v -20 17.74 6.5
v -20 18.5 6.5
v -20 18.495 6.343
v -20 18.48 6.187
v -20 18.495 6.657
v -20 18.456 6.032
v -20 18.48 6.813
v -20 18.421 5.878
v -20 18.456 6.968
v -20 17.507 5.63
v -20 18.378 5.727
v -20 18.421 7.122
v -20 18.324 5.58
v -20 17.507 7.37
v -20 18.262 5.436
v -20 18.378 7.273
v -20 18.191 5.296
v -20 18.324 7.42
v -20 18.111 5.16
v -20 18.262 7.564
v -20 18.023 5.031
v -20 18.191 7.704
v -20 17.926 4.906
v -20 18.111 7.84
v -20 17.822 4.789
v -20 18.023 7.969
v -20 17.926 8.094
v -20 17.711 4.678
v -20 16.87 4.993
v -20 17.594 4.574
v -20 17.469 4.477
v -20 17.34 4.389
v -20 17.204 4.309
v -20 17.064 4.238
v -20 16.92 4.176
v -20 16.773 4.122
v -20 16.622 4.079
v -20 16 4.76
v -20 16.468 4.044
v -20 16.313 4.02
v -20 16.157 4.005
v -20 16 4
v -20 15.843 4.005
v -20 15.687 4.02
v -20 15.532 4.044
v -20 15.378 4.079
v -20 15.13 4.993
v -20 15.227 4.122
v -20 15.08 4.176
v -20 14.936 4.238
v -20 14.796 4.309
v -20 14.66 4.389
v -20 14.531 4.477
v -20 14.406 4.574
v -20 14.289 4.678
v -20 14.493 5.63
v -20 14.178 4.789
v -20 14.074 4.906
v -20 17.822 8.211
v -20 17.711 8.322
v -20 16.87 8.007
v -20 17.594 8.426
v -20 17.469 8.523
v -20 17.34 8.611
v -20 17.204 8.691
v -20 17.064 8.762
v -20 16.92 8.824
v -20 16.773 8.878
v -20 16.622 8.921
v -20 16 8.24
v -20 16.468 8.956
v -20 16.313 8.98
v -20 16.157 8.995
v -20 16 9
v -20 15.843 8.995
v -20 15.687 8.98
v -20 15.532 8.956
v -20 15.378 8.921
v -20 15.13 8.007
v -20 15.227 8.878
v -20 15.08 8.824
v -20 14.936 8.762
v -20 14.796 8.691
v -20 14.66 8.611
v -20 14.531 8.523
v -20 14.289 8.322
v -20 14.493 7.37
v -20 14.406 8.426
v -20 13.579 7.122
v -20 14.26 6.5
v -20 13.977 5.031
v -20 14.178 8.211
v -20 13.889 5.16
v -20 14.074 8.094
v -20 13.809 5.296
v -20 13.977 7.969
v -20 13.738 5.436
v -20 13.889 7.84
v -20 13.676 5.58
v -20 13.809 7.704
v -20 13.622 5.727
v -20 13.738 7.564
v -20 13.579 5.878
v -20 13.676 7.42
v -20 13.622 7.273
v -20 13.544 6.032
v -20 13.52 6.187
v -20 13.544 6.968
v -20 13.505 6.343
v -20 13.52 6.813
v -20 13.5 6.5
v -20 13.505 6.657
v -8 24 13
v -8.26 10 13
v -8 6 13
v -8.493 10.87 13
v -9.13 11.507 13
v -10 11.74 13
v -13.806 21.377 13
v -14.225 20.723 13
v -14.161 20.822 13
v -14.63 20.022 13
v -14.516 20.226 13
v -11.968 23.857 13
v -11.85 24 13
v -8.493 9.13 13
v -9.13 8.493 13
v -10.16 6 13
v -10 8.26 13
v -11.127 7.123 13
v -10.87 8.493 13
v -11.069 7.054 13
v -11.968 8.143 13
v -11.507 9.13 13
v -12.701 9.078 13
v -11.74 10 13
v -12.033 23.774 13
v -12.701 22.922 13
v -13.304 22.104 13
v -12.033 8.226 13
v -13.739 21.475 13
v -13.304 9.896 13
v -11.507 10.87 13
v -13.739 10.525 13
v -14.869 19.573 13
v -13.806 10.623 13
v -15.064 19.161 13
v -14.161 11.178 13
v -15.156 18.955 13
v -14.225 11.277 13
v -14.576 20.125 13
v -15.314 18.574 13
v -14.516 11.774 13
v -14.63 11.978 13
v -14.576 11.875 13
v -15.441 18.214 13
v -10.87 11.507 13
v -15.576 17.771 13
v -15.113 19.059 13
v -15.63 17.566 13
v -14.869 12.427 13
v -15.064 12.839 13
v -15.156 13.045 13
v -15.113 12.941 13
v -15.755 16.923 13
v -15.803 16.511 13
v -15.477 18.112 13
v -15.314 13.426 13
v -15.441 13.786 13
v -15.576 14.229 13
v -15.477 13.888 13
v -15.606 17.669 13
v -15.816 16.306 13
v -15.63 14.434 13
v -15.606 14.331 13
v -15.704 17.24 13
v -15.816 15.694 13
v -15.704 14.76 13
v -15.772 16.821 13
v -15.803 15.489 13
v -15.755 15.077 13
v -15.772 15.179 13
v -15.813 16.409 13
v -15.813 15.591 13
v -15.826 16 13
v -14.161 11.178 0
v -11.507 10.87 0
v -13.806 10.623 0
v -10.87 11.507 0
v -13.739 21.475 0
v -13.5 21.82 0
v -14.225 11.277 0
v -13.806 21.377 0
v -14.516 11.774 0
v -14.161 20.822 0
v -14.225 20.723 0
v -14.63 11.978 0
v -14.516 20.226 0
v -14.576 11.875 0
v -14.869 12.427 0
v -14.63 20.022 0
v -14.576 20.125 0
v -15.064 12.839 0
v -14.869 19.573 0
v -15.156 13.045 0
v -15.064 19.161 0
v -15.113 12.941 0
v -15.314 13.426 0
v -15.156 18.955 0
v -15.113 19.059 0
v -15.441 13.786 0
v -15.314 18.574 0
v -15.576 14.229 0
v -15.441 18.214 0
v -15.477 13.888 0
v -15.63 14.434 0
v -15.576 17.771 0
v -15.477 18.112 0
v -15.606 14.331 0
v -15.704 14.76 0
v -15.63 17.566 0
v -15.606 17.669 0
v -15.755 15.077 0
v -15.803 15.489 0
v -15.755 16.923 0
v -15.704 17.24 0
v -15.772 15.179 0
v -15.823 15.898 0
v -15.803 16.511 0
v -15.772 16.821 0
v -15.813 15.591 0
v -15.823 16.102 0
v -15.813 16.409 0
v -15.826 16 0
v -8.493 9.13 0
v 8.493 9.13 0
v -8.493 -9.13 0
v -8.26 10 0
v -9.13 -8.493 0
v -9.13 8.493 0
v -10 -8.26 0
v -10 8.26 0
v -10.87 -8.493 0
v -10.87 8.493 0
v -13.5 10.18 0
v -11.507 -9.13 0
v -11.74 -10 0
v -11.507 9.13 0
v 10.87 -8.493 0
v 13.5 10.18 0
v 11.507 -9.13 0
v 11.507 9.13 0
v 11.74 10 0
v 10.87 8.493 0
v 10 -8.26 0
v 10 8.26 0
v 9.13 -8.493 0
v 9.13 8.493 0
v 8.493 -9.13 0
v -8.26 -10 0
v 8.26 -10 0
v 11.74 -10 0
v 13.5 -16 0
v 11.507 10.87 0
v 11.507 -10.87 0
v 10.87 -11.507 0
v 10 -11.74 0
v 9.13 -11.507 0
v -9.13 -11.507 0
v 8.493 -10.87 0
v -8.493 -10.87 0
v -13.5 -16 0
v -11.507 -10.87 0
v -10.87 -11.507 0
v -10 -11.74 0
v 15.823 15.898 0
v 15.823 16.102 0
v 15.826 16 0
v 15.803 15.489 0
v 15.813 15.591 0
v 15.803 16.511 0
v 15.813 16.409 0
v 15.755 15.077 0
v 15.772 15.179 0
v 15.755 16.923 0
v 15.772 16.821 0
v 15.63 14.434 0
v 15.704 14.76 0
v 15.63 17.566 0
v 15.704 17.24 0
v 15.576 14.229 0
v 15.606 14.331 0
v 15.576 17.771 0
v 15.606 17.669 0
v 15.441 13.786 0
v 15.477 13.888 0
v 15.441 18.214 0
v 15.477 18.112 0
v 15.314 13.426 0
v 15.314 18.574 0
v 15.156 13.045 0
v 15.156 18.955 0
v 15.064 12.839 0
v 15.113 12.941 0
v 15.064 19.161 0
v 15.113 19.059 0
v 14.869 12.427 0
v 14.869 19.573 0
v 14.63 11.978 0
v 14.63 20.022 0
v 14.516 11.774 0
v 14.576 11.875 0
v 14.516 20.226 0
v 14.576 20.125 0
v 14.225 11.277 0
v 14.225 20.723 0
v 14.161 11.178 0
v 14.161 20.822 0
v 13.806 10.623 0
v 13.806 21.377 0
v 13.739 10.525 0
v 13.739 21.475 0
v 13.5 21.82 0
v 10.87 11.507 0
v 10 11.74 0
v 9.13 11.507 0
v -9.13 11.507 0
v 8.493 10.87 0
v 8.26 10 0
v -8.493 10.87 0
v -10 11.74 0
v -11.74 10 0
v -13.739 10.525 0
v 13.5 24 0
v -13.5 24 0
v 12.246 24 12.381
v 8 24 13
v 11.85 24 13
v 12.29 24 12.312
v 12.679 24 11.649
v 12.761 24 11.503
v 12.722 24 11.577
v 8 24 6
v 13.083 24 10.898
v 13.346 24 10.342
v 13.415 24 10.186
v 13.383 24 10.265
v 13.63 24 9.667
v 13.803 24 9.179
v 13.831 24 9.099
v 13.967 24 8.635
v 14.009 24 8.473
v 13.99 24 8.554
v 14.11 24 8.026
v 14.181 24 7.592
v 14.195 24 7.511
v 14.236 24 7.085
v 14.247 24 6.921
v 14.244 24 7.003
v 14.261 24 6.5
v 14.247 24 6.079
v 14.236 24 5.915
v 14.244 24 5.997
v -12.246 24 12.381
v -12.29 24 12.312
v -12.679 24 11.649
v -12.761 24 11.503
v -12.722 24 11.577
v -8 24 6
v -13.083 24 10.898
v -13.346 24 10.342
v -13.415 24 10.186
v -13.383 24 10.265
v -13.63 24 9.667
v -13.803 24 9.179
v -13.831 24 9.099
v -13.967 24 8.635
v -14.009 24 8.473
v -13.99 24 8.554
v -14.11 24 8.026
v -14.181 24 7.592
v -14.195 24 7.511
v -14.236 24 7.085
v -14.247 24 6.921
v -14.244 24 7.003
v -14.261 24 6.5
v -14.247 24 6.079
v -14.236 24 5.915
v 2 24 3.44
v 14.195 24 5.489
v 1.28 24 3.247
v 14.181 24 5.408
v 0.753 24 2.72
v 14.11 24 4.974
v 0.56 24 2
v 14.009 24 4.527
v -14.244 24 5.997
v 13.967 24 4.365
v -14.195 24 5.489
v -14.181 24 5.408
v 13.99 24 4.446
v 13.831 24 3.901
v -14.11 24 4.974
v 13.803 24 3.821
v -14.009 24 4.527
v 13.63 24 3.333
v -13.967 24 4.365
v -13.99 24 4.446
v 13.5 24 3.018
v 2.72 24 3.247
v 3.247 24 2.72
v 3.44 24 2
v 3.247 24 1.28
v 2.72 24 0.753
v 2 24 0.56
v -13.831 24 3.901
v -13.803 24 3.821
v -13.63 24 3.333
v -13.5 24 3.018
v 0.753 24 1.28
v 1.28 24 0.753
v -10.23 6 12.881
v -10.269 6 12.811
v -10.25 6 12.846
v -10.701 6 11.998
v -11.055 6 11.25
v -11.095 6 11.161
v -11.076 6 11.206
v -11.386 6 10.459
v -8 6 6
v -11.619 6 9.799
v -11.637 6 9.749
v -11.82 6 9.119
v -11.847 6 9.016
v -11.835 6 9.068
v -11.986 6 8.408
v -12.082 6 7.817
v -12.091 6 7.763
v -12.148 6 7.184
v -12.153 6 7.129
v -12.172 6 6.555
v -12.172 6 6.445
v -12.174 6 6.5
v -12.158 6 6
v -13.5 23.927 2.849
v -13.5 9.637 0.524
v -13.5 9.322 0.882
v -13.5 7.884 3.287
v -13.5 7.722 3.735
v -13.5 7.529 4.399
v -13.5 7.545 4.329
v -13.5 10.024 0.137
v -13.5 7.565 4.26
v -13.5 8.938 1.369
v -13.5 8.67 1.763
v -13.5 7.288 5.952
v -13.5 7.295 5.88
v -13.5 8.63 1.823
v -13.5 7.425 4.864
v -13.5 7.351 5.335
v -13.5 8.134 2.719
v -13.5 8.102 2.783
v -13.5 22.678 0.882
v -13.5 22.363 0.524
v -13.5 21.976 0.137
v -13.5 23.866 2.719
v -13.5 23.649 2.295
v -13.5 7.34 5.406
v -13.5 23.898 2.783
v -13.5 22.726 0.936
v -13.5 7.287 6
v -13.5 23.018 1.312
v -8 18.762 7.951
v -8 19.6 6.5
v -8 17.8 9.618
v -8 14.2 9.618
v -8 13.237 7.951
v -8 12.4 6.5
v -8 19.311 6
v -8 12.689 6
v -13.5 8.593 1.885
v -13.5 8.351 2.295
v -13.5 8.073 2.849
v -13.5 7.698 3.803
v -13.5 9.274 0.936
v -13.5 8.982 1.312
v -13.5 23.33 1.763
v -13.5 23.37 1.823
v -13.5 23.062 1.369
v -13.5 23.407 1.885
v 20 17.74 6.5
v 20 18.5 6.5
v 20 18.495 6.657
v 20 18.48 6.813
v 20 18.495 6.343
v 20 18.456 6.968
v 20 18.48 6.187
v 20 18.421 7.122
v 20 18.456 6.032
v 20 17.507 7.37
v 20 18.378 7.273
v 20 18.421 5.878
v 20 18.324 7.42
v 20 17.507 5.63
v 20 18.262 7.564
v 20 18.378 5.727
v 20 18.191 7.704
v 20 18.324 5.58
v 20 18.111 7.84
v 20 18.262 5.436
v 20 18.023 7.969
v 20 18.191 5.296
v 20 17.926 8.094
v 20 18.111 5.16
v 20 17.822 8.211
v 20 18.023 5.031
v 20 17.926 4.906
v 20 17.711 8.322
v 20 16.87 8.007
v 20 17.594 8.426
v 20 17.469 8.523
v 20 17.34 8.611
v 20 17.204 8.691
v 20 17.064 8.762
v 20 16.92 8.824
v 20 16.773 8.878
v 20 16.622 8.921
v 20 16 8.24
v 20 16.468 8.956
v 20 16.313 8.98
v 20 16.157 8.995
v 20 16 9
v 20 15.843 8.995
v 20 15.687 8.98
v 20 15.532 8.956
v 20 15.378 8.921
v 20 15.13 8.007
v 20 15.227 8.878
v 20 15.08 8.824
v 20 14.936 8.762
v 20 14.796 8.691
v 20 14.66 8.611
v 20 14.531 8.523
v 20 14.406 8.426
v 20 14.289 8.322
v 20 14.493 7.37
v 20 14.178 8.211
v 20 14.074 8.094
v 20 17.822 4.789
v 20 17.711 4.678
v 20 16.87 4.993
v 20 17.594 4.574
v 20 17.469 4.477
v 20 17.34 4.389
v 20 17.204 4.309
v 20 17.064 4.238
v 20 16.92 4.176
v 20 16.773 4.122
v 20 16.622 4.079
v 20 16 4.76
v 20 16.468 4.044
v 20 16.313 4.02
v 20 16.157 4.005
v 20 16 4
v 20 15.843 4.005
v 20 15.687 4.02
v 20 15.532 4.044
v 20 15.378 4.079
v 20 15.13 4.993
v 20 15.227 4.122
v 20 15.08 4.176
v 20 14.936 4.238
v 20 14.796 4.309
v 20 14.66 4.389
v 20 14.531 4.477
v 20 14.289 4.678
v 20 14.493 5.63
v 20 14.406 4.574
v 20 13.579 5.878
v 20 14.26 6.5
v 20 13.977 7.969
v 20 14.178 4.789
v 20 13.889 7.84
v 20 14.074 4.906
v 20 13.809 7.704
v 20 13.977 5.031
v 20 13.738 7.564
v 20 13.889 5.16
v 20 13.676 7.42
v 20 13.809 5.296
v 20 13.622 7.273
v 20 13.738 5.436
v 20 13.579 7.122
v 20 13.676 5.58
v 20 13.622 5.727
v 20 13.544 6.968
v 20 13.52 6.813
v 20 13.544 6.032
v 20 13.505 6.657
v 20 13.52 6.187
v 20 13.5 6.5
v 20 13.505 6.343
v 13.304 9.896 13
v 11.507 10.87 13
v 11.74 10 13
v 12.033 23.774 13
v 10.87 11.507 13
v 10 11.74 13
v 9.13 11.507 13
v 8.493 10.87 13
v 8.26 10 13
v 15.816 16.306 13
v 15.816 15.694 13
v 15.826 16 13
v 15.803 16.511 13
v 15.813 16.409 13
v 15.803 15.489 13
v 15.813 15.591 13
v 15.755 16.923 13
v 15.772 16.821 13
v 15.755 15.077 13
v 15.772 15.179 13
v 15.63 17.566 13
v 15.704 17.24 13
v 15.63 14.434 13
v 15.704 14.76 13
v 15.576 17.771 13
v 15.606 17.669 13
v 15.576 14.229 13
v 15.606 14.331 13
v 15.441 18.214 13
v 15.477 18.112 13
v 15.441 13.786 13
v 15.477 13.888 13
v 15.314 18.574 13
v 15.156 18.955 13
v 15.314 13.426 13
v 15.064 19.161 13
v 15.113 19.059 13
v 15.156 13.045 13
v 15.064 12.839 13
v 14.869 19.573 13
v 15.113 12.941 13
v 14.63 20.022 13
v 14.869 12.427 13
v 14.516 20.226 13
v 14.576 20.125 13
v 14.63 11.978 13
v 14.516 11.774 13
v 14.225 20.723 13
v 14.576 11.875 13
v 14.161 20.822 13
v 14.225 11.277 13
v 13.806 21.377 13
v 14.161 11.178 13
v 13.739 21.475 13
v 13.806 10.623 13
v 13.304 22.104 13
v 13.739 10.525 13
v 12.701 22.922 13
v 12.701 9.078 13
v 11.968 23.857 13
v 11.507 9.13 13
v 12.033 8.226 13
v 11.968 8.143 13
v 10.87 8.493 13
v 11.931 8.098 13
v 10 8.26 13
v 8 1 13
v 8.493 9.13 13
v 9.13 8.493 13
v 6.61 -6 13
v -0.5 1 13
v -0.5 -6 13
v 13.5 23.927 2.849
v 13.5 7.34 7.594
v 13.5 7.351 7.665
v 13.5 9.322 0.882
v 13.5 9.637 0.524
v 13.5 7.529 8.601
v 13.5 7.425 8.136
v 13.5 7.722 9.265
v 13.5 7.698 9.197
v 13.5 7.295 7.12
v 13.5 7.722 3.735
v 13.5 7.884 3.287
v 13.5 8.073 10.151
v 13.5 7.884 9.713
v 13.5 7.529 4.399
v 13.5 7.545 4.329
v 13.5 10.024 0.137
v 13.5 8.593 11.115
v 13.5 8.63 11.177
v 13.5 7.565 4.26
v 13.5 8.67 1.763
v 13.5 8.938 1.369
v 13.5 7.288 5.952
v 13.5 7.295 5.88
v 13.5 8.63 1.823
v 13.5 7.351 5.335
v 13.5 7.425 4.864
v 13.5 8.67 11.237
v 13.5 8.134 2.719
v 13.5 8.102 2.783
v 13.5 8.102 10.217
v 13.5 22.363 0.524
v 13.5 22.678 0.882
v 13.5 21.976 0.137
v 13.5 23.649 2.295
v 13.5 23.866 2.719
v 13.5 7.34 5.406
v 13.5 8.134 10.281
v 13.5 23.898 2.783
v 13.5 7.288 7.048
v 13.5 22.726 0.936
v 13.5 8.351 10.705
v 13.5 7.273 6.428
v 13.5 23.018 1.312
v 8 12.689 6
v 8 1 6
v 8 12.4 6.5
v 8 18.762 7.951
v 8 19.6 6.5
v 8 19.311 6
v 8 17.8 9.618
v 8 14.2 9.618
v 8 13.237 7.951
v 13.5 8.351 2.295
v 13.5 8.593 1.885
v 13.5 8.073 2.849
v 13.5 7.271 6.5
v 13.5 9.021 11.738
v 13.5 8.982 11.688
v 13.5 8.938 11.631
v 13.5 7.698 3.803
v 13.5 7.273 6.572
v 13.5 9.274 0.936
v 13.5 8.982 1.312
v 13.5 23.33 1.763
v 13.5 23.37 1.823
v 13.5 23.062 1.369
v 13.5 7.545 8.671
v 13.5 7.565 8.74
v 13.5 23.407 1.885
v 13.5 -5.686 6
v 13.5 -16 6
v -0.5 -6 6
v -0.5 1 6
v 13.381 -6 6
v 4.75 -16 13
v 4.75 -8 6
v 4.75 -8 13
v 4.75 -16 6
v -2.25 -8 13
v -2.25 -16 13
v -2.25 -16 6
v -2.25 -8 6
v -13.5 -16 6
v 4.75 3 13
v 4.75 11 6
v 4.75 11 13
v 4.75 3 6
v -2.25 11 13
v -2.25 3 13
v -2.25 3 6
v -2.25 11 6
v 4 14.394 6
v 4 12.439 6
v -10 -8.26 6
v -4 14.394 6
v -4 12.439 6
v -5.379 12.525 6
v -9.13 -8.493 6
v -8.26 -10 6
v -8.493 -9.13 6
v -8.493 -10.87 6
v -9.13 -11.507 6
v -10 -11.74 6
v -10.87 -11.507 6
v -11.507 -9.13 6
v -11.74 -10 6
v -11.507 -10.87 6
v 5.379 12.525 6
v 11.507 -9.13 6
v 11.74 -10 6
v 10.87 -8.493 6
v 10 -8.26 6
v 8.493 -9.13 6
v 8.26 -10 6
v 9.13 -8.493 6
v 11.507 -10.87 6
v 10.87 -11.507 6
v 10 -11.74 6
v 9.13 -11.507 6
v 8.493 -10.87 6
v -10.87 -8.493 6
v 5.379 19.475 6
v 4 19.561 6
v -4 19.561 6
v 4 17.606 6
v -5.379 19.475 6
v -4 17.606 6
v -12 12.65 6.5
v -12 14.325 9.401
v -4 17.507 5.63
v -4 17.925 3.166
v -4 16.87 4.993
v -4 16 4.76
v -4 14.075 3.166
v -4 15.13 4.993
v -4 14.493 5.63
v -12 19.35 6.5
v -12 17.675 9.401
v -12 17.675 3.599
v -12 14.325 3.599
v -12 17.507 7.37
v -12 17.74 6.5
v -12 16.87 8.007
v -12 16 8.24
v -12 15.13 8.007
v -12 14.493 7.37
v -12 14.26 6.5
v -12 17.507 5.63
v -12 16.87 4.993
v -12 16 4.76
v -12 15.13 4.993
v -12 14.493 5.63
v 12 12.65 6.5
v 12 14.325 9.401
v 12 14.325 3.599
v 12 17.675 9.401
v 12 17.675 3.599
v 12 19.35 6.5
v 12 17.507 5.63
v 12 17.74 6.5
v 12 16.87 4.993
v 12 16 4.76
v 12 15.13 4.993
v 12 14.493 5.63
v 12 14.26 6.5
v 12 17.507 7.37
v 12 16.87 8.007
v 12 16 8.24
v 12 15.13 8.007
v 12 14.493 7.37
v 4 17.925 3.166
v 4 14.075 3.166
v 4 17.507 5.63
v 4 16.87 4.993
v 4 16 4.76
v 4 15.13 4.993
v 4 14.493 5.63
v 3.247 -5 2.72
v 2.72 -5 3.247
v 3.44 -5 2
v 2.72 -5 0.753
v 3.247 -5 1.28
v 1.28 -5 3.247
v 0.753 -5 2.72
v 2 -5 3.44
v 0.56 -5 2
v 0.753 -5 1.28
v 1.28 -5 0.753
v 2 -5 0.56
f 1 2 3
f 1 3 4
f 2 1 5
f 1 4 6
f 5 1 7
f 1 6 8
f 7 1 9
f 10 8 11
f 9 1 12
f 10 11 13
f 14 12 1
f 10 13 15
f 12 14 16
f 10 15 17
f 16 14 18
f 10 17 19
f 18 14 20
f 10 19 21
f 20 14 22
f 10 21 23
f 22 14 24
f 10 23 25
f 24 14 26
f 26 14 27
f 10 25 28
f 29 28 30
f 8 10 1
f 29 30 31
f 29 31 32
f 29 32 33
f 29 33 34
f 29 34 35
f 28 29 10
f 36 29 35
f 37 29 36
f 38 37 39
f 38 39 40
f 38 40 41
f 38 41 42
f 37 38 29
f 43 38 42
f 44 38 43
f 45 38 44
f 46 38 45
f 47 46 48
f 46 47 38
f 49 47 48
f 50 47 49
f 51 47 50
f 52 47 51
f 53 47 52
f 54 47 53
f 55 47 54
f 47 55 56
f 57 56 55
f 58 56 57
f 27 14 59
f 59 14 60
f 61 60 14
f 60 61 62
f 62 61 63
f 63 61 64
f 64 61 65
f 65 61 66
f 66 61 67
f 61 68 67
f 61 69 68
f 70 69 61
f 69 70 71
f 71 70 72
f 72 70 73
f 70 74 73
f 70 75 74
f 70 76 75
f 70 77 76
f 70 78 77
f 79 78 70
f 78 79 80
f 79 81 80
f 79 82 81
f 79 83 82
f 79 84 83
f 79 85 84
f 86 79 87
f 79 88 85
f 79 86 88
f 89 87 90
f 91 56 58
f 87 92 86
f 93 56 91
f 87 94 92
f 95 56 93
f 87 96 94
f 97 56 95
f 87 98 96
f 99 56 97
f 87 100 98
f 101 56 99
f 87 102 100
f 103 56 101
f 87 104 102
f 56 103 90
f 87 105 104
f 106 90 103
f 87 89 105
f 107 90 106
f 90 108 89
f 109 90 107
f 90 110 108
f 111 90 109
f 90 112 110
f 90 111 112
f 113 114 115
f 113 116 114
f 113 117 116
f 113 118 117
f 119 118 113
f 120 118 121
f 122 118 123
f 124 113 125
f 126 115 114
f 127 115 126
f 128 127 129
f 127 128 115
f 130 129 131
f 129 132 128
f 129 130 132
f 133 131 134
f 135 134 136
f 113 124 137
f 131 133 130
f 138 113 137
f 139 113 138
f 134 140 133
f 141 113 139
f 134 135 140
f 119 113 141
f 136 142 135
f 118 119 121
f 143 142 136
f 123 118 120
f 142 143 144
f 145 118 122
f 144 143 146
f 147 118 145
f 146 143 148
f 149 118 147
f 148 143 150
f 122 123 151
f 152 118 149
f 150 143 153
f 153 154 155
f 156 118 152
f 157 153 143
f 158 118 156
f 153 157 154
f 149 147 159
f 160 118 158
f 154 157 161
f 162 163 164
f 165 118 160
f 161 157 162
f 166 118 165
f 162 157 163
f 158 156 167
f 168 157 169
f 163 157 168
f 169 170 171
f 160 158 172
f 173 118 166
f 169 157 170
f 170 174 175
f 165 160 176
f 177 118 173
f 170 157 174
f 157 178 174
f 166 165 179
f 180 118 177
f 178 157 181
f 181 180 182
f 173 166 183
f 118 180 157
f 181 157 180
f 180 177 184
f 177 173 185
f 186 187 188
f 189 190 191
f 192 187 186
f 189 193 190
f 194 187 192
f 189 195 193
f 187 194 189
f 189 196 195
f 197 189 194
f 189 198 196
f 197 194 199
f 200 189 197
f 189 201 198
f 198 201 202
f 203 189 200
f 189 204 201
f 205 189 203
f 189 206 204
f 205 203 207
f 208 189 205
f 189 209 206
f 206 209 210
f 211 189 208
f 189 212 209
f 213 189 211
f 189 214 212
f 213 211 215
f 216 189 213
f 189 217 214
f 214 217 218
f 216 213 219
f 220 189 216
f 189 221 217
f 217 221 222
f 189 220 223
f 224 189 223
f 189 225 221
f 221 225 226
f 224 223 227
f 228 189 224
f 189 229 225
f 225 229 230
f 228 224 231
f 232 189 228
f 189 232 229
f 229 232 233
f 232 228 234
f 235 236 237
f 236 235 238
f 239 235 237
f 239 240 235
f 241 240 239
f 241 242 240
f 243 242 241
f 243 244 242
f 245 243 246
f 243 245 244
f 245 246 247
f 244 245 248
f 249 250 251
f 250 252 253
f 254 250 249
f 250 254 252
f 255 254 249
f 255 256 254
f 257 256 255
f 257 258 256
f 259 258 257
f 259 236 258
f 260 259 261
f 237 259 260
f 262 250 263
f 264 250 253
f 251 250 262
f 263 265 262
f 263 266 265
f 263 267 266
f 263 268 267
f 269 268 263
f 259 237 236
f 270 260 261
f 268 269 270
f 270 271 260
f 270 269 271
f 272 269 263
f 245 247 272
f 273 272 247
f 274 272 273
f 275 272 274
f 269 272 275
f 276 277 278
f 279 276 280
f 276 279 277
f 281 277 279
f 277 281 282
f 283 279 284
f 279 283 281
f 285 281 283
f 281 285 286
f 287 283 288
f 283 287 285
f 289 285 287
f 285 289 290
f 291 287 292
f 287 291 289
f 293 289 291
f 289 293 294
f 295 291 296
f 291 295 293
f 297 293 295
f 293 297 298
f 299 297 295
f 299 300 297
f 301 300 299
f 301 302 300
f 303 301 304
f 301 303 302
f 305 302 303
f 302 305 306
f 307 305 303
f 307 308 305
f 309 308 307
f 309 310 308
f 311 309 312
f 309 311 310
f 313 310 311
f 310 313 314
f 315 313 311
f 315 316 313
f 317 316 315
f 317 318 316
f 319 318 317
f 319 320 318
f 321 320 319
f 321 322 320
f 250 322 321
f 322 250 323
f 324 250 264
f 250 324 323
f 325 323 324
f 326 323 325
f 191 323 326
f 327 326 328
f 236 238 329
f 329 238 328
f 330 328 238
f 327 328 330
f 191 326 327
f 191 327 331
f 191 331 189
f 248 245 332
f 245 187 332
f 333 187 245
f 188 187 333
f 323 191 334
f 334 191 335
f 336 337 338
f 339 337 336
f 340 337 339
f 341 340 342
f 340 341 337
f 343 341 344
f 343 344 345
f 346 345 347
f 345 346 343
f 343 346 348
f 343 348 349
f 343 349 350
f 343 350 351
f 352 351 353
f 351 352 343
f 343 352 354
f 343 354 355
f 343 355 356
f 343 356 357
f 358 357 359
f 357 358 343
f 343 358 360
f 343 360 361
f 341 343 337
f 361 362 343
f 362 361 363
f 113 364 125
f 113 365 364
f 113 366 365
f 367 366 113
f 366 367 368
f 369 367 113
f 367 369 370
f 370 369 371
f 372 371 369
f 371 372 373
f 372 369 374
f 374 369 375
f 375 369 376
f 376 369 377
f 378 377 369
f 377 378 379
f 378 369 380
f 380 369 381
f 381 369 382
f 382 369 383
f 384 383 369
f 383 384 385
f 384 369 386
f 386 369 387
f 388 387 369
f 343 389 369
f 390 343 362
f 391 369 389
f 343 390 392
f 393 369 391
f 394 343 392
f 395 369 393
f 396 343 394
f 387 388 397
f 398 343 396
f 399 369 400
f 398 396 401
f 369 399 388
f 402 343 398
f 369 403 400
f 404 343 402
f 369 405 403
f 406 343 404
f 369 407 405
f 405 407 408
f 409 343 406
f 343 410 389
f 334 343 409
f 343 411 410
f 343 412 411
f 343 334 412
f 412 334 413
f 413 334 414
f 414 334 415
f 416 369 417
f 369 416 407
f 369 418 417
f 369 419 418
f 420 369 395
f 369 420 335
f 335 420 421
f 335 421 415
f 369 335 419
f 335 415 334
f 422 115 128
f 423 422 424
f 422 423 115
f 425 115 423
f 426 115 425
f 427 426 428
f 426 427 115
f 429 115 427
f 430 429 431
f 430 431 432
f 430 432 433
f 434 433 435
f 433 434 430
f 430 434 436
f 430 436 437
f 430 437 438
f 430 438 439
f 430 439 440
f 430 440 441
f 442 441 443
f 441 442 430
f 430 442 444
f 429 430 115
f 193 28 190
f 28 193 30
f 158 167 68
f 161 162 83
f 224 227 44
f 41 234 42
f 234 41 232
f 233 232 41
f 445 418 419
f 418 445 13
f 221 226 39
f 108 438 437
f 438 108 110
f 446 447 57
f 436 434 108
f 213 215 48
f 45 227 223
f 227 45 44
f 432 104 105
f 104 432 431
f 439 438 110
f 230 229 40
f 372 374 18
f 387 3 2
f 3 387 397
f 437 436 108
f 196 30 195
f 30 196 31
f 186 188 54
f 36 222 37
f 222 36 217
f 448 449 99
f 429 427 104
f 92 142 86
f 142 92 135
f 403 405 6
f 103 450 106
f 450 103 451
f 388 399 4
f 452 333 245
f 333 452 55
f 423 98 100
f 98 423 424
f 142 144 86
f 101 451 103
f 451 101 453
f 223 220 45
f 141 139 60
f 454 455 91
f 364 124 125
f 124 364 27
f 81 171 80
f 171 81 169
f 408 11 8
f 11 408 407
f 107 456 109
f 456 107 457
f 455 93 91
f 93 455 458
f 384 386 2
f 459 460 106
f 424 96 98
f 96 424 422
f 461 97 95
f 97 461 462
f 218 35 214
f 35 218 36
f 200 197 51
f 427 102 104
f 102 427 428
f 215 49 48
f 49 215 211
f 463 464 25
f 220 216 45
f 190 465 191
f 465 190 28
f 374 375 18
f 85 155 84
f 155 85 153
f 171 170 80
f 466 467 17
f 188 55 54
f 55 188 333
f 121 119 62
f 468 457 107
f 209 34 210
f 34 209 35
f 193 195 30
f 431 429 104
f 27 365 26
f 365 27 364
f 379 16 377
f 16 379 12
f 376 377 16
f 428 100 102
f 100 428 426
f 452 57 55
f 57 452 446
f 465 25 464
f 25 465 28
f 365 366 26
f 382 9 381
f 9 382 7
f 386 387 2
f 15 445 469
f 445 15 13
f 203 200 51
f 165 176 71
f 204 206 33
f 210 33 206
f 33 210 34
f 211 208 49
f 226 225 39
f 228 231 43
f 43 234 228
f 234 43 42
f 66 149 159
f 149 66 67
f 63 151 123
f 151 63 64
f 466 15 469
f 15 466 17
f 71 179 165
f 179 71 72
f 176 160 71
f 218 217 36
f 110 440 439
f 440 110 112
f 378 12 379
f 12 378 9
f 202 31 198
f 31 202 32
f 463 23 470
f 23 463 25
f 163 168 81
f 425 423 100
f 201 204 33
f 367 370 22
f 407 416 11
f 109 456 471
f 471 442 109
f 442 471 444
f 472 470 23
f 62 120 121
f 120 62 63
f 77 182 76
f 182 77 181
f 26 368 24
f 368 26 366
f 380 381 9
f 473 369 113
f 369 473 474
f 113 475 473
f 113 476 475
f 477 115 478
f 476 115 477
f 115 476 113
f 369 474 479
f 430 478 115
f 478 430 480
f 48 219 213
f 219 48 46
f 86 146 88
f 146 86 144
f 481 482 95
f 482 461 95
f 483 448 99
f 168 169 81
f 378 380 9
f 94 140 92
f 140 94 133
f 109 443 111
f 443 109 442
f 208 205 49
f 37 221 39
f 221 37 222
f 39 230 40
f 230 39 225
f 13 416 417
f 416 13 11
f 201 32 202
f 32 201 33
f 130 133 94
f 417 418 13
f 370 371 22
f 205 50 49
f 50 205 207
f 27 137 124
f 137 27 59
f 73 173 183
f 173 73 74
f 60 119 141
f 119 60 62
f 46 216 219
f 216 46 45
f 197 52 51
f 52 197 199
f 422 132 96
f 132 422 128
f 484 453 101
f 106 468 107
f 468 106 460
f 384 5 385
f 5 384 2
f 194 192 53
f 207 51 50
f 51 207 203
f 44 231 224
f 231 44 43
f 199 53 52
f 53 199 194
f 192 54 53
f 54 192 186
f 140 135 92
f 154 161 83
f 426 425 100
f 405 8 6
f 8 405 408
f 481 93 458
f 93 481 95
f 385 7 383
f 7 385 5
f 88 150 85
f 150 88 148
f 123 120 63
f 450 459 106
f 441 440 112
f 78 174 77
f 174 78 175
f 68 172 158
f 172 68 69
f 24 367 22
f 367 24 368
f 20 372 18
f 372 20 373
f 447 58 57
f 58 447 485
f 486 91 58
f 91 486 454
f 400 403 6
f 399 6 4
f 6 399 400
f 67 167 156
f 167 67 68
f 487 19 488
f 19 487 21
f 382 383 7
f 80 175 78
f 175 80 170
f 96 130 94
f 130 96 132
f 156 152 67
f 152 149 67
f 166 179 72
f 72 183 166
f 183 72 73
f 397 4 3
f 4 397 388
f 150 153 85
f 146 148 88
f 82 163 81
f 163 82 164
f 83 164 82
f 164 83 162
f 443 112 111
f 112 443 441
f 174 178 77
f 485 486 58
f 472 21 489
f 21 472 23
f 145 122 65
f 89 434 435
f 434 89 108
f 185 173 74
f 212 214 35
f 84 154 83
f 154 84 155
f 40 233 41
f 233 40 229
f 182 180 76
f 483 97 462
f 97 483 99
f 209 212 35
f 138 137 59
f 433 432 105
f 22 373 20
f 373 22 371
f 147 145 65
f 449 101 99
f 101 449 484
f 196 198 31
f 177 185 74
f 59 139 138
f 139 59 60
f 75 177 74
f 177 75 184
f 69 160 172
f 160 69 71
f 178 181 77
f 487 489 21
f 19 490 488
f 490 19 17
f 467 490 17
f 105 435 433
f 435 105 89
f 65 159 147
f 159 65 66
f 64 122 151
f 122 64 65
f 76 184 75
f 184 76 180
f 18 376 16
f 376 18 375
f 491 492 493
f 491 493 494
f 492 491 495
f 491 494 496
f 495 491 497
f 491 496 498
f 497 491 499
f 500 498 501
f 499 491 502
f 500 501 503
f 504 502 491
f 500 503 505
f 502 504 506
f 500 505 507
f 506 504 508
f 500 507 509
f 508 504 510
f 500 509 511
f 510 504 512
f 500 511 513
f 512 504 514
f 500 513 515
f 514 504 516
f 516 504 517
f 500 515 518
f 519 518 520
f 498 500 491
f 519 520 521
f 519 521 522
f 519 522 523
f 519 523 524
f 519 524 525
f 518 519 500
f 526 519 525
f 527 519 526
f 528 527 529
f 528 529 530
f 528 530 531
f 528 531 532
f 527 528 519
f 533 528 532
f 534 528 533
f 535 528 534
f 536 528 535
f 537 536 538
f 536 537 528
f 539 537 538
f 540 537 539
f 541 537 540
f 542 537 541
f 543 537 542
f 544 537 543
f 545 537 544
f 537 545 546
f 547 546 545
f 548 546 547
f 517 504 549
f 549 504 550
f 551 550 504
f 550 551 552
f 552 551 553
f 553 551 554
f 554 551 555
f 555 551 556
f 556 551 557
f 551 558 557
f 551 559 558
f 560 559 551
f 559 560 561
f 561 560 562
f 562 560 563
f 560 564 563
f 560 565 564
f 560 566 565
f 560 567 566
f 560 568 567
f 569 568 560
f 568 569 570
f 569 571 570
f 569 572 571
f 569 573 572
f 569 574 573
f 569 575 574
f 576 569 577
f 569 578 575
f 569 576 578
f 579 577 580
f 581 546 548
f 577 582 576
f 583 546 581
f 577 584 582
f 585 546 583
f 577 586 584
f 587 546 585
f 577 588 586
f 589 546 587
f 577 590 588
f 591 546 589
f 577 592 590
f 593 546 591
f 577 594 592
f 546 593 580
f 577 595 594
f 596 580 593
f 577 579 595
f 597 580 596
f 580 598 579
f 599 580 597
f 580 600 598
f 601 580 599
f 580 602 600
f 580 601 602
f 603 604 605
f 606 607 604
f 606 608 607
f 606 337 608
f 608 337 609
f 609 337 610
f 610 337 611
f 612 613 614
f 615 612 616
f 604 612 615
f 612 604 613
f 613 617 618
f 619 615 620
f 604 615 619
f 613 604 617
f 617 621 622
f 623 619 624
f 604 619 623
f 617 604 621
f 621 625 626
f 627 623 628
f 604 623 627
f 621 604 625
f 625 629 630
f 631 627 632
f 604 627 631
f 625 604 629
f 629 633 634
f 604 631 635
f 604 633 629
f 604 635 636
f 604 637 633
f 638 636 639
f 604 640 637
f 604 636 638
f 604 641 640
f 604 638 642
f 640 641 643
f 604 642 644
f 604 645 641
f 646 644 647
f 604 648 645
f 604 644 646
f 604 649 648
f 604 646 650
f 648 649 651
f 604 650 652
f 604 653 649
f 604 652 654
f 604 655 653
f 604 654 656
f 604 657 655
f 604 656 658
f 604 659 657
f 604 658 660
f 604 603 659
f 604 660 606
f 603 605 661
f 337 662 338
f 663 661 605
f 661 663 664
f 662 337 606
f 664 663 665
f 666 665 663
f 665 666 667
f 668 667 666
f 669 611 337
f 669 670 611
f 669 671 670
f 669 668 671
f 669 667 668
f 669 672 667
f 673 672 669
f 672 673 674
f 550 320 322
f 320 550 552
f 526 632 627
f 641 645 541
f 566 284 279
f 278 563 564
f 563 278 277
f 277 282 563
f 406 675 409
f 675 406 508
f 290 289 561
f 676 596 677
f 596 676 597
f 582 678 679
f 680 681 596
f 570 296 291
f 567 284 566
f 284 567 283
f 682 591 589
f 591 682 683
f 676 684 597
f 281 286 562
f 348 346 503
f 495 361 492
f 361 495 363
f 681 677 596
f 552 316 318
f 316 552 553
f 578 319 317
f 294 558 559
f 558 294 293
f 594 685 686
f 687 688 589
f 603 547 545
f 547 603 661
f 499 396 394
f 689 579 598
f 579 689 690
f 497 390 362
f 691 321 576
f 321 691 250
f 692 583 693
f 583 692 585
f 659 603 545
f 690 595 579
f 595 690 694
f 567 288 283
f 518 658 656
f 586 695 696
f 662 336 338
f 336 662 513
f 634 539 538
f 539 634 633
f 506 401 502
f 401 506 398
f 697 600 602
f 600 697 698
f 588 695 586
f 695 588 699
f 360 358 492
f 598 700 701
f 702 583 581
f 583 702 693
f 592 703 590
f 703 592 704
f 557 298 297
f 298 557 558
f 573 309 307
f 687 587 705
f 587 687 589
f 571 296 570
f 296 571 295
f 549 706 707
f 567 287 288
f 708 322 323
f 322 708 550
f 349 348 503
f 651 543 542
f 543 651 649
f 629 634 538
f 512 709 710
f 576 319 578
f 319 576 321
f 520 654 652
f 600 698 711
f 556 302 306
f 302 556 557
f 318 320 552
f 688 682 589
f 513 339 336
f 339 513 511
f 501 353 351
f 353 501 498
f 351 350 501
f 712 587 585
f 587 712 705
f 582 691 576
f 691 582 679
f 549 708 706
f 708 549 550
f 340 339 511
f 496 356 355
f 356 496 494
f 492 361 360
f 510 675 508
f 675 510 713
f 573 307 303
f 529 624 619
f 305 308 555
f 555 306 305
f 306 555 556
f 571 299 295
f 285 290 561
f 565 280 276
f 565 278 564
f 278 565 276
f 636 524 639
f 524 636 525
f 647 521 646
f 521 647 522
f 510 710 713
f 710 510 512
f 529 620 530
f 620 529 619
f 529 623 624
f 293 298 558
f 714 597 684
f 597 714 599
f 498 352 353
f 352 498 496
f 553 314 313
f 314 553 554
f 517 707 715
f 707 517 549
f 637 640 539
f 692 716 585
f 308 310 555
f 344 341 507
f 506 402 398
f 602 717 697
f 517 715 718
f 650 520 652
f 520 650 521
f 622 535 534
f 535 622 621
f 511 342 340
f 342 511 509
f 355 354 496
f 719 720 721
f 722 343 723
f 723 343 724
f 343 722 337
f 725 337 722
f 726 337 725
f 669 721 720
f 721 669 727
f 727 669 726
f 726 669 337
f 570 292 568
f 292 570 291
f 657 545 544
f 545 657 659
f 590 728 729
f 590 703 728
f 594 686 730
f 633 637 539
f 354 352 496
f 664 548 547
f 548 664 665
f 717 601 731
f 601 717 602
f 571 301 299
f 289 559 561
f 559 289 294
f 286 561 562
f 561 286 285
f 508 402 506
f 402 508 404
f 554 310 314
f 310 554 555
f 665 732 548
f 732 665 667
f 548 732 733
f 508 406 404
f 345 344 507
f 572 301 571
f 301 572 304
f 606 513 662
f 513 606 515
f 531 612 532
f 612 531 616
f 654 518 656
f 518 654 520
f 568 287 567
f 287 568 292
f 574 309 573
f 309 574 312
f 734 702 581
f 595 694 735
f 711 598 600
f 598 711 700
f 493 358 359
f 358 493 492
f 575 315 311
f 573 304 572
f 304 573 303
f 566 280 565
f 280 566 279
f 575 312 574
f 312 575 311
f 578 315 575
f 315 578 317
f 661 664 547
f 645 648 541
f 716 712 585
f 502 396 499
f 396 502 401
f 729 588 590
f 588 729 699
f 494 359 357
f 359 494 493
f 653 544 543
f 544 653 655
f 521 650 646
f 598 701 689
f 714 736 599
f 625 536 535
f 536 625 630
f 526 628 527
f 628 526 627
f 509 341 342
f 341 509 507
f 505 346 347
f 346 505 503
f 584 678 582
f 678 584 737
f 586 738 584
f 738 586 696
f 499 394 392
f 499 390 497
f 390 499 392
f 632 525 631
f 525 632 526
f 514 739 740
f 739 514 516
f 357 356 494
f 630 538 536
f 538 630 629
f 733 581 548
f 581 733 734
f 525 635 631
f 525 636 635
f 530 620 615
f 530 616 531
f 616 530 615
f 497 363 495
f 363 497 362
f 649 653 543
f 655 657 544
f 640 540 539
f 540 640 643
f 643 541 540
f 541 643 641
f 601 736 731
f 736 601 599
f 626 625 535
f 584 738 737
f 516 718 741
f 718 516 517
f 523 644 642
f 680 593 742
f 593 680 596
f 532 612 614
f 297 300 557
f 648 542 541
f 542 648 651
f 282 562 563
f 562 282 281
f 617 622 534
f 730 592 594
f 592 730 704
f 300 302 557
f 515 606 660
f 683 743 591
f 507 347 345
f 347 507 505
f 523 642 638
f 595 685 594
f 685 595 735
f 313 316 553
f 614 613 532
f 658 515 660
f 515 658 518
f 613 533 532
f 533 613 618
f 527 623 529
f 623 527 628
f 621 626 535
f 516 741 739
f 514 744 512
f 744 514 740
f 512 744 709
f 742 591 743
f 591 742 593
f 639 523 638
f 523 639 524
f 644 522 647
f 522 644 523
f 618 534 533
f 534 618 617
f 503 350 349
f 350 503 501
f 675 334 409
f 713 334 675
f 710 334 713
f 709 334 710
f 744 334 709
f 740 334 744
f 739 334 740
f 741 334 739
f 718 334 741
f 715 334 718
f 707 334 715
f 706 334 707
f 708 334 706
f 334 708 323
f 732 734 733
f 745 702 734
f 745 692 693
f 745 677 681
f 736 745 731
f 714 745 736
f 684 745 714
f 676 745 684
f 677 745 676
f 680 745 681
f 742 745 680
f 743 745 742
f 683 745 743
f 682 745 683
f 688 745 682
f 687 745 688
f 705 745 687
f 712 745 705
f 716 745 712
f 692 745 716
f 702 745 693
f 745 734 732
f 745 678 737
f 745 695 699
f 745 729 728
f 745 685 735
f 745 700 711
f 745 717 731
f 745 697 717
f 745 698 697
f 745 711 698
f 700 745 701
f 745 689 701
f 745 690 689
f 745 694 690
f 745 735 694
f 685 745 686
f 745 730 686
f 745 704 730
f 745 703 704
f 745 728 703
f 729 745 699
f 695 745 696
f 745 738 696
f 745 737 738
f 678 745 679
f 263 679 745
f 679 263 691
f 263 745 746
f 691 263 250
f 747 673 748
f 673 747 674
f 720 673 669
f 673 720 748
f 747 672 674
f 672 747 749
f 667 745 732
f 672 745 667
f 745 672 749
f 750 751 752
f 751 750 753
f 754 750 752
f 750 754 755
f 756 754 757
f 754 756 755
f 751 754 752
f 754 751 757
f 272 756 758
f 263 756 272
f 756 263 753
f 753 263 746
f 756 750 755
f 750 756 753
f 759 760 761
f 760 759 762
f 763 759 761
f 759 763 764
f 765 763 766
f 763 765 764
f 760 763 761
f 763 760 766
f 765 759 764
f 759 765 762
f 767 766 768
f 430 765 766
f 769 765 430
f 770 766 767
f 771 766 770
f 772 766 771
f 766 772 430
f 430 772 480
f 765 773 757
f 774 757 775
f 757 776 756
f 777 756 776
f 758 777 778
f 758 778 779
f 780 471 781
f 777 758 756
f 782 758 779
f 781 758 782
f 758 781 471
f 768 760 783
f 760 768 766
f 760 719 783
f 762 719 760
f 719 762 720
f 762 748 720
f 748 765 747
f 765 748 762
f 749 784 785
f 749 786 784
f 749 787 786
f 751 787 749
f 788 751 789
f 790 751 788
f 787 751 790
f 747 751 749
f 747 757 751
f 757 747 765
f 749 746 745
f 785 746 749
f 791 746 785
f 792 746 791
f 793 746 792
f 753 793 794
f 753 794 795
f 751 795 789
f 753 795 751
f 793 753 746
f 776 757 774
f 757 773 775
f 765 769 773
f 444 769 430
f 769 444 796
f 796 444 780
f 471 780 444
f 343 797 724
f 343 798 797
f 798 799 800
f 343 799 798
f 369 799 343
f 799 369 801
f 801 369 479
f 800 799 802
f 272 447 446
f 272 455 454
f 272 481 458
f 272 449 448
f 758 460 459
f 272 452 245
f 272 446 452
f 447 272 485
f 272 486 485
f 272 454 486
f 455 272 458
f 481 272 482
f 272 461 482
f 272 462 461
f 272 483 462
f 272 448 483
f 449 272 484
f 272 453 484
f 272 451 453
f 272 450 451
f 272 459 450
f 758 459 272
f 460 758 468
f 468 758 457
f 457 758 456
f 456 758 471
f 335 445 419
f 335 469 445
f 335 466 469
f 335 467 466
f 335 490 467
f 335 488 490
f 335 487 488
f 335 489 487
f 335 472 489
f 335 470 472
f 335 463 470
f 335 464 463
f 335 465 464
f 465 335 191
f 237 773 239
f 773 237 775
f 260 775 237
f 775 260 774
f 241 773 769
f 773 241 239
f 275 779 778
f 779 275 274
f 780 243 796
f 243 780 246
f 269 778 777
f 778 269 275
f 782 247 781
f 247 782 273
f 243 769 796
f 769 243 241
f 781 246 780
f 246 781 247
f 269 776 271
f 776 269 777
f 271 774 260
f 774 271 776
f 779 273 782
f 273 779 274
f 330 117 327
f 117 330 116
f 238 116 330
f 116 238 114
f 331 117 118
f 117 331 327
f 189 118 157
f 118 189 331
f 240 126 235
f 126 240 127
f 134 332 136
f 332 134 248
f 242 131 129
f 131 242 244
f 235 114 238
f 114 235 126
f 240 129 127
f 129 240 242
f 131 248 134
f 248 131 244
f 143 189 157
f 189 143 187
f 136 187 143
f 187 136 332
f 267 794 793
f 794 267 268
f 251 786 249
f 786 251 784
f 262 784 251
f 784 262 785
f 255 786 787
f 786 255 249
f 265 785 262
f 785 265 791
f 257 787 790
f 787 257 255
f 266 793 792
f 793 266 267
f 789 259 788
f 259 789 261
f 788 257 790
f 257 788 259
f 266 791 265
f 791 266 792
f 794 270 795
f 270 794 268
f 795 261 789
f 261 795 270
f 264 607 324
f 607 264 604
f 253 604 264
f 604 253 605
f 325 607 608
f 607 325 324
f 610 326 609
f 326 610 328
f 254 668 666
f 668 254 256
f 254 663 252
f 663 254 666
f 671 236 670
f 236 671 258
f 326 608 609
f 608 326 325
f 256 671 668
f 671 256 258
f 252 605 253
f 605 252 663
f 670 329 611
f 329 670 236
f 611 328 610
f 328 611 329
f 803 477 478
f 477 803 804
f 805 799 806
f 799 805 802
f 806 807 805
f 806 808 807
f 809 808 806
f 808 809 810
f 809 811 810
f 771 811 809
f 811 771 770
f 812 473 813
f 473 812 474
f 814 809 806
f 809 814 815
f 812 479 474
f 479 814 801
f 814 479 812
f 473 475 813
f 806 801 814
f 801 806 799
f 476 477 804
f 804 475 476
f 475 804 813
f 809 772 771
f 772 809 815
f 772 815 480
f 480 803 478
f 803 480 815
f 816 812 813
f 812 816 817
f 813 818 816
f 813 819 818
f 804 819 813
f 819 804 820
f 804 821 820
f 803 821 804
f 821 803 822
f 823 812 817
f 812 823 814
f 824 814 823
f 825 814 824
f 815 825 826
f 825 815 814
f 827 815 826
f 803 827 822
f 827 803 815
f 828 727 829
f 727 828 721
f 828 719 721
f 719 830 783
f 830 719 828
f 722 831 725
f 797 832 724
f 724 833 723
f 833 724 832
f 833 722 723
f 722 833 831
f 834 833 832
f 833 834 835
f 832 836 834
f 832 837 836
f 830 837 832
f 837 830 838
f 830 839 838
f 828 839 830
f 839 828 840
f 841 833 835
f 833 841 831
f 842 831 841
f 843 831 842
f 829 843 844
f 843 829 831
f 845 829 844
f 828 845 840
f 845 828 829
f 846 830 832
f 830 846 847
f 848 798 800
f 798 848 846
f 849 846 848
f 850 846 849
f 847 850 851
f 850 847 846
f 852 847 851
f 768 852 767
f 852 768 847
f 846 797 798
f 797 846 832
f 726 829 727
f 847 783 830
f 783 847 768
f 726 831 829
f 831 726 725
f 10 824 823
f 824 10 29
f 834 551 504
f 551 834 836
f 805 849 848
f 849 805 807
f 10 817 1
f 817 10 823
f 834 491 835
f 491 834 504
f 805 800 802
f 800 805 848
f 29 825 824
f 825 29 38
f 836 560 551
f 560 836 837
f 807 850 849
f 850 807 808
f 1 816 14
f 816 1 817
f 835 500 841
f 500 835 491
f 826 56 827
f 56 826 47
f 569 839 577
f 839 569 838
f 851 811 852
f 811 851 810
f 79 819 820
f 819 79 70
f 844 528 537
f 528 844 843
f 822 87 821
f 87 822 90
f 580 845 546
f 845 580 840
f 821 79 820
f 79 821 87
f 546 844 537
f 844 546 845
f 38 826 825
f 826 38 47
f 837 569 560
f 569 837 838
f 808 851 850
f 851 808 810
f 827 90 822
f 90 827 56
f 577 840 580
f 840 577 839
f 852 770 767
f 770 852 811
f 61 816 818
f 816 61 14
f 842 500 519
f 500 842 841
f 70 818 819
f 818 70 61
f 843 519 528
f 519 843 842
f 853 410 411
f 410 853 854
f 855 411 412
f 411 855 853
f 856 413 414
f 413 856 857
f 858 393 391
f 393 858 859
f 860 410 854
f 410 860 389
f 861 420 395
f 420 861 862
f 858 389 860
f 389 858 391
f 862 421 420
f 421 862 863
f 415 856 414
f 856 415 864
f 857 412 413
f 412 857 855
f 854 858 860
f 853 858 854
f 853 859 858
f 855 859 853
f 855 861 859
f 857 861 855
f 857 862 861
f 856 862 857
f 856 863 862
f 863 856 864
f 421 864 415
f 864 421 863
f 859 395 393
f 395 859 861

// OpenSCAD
// file: configuration.scad
// Increase this if your slicer or printer make holes too tight.
extra_radius = 0.1;

// OD = outside diameter, corner to corner.
m3_nut_od = 6.1;
m3_nut_radius = m3_nut_od/2 + 0.2 + extra_radius;
m3_washer_radius = 3.5 + extra_radius;
m3_washer_height = 0.65;

// Major diameter of metric 3mm thread.
m3_head_height = 3;
m3_major = 2.88;
m3_radius = m3_major/2 + extra_radius;
m3_wide_radius = m3_major/2 + extra_radius + 0.2;

// NEMA17 stepper motors.
motor_shaft_diameter = 5;
motor_shaft_radius = motor_shaft_diameter/2 + extra_radius;

// Frame brackets. M3x8mm screws work best with 3.6 mm brackets.
thickness = 3.6;

// OpenBeam or Misumi. Currently only 15x15 mm, but there is a plan
// to make models more parametric and allow 20x20 mm in the future.
extrusion = 15;

// Placement for the NEMA17 stepper motors.
motor_offset = 44;
motor_length = 47;
// main file
include <configuration.scad>;

separation = 40;
thickness = 6;

horn_thickness = 13;
horn_x = 8;

belt_width = 5;
belt_x = 5.6;
belt_z = 7;

module carriage() {
  // Timing belt (up and down).
  translate([-belt_x, 0, belt_z + belt_width/2]) %
    cube([1.7, 100, belt_width], center=true);
  translate([belt_x, 0, belt_z + belt_width/2]) %
    cube([1.7, 100, belt_width], center=true);
  difference() {
    union() {
      // Main body.
      translate([0, 4, thickness/2])
        cube([27, 40, thickness], center=true);
      // Ball joint mount horns.
      for (x = [-1, 1]) {
        scale([x, 1, 1]) intersection() {
          translate([0, 15, horn_thickness/2])
            cube([separation, 18, horn_thickness], center=true);
          translate([horn_x, 16, horn_thickness/2]) rotate([0, 90, 0])
            cylinder(r1=14, r2=2.5, h=separation/2-horn_x, $fn=100);
        }
      }
      // Belt clamps.
      difference() {
        union() {
          translate([6.5, -2.5, horn_thickness/2+1])
            cube([14, 7, horn_thickness-2], center=true);
          translate([10.75, 2.5, horn_thickness/2+1])
            cube([5.5, 16, horn_thickness-2], center=true);
        }
        // Avoid touching diagonal push rods (carbon tube).
        translate([20, -10, 12.5]) rotate([35, 35, 30])
          cube([40, 40, 20], center=true);
      }
      for (y = [-12, 7]) {
        translate([1.25, y, horn_thickness/2+1])
          cube([7, 8, horn_thickness-2], center=true);
      }
    }
    // Screws for linear slider.
    for (x = [-10, 10]) {
      for (y = [-10, 10]) {
        translate([x, y, thickness]) #
          cylinder(r=m3_wide_radius, h=30, center=true, $fn=12);
      }
    }
    // Screws for ball joints.
    translate([0, 16, horn_thickness/2]) rotate([0, 90, 0]) #
      cylinder(r=m3_wide_radius, h=60, center=true, $fn=12);
    // Lock nuts for ball joints.
    for (x = [-1, 1]) {
      scale([x, 1, 1]) intersection() {
        translate([horn_x, 16, horn_thickness/2]) rotate([90, 0, -90])
          cylinder(r1=m3_nut_radius, r2=m3_nut_radius+0.5, h=8,
                   center=true, $fn=6);
      }
    }
	 // Screw for endstop adjustment.
	 translate([2, 10, 2])
	 rotate([90, 0, 0])
		#cylinder(r=m3_radius-extra_radius, h=30, center=true, $fn=12);
  }
}

carriage();
